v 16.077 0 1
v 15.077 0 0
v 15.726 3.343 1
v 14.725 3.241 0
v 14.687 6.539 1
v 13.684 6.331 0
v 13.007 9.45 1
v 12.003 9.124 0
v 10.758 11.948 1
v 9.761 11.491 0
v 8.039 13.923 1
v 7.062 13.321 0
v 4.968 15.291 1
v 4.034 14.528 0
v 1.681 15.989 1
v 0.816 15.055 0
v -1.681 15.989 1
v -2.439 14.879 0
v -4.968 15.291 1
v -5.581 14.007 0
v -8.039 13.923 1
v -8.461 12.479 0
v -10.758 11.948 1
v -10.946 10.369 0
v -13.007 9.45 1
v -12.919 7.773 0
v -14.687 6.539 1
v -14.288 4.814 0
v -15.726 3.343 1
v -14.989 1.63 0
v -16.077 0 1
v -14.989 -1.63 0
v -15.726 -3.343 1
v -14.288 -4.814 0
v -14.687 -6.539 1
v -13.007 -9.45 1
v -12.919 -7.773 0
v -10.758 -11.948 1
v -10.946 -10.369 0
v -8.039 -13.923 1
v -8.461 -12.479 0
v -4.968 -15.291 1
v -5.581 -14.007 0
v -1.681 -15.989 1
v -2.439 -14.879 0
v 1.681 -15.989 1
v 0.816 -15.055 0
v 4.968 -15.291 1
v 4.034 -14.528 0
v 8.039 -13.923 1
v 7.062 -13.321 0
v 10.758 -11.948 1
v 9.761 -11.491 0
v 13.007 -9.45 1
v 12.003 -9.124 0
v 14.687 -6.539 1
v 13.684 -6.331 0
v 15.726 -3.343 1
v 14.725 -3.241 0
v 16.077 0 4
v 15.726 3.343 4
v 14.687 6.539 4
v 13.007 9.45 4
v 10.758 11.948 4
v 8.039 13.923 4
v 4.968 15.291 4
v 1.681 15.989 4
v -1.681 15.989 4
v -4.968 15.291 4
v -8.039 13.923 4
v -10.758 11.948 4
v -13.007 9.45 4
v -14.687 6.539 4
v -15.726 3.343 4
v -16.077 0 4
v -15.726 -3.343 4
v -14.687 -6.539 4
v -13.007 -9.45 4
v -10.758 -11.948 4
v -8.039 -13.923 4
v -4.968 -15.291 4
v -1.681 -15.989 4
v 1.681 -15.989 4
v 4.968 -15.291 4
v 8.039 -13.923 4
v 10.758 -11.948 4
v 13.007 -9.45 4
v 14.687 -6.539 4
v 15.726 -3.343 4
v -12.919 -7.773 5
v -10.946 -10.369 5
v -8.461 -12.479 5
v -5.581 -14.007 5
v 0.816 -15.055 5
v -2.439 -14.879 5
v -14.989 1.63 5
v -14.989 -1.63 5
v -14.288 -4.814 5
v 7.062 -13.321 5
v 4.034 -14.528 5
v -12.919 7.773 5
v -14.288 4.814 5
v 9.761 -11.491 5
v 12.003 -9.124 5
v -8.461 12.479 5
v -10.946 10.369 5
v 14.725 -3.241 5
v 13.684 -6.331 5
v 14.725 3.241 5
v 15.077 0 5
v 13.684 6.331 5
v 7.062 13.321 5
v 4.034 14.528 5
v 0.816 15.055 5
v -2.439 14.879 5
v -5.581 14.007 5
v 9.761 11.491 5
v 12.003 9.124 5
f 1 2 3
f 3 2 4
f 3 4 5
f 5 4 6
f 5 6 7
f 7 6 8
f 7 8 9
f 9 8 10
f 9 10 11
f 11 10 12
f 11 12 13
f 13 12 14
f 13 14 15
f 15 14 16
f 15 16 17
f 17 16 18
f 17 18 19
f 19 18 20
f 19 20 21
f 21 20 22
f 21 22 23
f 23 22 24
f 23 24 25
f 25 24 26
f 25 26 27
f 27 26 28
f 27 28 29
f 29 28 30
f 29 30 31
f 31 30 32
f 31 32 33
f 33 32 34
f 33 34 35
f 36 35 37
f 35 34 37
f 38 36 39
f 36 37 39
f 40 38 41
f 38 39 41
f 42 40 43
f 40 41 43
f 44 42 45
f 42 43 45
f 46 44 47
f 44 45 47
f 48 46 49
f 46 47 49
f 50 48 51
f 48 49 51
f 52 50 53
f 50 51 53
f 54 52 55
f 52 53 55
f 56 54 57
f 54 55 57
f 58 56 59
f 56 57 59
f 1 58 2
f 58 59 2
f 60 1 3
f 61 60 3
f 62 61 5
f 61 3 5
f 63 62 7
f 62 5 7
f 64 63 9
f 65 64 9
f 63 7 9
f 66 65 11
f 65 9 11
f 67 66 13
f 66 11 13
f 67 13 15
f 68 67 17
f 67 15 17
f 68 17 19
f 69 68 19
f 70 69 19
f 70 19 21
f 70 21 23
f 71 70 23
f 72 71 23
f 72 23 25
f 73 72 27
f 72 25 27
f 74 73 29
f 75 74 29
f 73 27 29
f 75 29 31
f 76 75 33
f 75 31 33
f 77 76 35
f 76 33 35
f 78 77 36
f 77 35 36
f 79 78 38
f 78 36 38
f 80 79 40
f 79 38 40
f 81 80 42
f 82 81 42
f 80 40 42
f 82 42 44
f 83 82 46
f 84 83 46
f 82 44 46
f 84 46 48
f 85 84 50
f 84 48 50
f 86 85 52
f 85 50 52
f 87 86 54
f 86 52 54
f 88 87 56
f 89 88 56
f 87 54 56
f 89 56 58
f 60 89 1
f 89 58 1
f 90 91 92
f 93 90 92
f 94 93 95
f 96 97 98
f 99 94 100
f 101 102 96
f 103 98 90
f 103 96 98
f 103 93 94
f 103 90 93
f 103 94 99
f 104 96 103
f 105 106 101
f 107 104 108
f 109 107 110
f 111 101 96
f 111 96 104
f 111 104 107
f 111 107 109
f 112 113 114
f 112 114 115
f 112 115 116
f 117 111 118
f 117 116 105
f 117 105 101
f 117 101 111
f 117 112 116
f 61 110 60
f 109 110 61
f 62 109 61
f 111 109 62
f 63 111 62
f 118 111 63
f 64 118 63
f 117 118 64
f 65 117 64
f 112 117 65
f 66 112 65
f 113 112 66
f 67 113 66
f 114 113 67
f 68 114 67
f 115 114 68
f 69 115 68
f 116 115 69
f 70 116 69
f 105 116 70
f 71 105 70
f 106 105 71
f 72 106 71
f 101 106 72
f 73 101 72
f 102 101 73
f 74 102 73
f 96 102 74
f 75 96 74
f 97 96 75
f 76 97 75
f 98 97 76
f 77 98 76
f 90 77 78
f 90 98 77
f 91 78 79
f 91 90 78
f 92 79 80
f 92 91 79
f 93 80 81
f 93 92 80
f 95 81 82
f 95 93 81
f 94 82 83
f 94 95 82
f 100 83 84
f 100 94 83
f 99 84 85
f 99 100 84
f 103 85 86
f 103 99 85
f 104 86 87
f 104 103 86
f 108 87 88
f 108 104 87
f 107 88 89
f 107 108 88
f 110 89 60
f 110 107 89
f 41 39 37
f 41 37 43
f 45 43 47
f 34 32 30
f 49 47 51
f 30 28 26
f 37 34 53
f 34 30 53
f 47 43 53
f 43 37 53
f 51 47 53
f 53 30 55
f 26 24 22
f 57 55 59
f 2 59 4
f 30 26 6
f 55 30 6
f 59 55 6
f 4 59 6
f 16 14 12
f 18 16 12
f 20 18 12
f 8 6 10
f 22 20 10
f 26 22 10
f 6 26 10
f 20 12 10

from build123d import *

# Parameters (mm, degrees)
F0_R     = 16.0774395659
F1_DEPTH = 5
F2_SIZE  = 1
F5_SIZE  = 1


# Not quite as in the source:
# - the program builds the solid bodies; features that only make, move or delete a surface that nothing else refers to are left out


with BuildPart() as f1:
    # F0 (on Top) → F1 (new body)
    with BuildSketch(Plane.XY):
        Circle(F0_R)
    extrude(amount=F1_DEPTH)

    # F2
    f2_edges = [f1.edges().sort_by_distance(p)[0] for p in [
        (-16.07744, 0, 5),
    ]]
    chamfer(f2_edges, length=F2_SIZE)

    # F5
    f5_edges = [f1.edges().sort_by_distance(p)[0] for p in [
        (-16.07744, 0, 0),
    ]]
    chamfer(f5_edges, length=F5_SIZE)


solid = f1.part
